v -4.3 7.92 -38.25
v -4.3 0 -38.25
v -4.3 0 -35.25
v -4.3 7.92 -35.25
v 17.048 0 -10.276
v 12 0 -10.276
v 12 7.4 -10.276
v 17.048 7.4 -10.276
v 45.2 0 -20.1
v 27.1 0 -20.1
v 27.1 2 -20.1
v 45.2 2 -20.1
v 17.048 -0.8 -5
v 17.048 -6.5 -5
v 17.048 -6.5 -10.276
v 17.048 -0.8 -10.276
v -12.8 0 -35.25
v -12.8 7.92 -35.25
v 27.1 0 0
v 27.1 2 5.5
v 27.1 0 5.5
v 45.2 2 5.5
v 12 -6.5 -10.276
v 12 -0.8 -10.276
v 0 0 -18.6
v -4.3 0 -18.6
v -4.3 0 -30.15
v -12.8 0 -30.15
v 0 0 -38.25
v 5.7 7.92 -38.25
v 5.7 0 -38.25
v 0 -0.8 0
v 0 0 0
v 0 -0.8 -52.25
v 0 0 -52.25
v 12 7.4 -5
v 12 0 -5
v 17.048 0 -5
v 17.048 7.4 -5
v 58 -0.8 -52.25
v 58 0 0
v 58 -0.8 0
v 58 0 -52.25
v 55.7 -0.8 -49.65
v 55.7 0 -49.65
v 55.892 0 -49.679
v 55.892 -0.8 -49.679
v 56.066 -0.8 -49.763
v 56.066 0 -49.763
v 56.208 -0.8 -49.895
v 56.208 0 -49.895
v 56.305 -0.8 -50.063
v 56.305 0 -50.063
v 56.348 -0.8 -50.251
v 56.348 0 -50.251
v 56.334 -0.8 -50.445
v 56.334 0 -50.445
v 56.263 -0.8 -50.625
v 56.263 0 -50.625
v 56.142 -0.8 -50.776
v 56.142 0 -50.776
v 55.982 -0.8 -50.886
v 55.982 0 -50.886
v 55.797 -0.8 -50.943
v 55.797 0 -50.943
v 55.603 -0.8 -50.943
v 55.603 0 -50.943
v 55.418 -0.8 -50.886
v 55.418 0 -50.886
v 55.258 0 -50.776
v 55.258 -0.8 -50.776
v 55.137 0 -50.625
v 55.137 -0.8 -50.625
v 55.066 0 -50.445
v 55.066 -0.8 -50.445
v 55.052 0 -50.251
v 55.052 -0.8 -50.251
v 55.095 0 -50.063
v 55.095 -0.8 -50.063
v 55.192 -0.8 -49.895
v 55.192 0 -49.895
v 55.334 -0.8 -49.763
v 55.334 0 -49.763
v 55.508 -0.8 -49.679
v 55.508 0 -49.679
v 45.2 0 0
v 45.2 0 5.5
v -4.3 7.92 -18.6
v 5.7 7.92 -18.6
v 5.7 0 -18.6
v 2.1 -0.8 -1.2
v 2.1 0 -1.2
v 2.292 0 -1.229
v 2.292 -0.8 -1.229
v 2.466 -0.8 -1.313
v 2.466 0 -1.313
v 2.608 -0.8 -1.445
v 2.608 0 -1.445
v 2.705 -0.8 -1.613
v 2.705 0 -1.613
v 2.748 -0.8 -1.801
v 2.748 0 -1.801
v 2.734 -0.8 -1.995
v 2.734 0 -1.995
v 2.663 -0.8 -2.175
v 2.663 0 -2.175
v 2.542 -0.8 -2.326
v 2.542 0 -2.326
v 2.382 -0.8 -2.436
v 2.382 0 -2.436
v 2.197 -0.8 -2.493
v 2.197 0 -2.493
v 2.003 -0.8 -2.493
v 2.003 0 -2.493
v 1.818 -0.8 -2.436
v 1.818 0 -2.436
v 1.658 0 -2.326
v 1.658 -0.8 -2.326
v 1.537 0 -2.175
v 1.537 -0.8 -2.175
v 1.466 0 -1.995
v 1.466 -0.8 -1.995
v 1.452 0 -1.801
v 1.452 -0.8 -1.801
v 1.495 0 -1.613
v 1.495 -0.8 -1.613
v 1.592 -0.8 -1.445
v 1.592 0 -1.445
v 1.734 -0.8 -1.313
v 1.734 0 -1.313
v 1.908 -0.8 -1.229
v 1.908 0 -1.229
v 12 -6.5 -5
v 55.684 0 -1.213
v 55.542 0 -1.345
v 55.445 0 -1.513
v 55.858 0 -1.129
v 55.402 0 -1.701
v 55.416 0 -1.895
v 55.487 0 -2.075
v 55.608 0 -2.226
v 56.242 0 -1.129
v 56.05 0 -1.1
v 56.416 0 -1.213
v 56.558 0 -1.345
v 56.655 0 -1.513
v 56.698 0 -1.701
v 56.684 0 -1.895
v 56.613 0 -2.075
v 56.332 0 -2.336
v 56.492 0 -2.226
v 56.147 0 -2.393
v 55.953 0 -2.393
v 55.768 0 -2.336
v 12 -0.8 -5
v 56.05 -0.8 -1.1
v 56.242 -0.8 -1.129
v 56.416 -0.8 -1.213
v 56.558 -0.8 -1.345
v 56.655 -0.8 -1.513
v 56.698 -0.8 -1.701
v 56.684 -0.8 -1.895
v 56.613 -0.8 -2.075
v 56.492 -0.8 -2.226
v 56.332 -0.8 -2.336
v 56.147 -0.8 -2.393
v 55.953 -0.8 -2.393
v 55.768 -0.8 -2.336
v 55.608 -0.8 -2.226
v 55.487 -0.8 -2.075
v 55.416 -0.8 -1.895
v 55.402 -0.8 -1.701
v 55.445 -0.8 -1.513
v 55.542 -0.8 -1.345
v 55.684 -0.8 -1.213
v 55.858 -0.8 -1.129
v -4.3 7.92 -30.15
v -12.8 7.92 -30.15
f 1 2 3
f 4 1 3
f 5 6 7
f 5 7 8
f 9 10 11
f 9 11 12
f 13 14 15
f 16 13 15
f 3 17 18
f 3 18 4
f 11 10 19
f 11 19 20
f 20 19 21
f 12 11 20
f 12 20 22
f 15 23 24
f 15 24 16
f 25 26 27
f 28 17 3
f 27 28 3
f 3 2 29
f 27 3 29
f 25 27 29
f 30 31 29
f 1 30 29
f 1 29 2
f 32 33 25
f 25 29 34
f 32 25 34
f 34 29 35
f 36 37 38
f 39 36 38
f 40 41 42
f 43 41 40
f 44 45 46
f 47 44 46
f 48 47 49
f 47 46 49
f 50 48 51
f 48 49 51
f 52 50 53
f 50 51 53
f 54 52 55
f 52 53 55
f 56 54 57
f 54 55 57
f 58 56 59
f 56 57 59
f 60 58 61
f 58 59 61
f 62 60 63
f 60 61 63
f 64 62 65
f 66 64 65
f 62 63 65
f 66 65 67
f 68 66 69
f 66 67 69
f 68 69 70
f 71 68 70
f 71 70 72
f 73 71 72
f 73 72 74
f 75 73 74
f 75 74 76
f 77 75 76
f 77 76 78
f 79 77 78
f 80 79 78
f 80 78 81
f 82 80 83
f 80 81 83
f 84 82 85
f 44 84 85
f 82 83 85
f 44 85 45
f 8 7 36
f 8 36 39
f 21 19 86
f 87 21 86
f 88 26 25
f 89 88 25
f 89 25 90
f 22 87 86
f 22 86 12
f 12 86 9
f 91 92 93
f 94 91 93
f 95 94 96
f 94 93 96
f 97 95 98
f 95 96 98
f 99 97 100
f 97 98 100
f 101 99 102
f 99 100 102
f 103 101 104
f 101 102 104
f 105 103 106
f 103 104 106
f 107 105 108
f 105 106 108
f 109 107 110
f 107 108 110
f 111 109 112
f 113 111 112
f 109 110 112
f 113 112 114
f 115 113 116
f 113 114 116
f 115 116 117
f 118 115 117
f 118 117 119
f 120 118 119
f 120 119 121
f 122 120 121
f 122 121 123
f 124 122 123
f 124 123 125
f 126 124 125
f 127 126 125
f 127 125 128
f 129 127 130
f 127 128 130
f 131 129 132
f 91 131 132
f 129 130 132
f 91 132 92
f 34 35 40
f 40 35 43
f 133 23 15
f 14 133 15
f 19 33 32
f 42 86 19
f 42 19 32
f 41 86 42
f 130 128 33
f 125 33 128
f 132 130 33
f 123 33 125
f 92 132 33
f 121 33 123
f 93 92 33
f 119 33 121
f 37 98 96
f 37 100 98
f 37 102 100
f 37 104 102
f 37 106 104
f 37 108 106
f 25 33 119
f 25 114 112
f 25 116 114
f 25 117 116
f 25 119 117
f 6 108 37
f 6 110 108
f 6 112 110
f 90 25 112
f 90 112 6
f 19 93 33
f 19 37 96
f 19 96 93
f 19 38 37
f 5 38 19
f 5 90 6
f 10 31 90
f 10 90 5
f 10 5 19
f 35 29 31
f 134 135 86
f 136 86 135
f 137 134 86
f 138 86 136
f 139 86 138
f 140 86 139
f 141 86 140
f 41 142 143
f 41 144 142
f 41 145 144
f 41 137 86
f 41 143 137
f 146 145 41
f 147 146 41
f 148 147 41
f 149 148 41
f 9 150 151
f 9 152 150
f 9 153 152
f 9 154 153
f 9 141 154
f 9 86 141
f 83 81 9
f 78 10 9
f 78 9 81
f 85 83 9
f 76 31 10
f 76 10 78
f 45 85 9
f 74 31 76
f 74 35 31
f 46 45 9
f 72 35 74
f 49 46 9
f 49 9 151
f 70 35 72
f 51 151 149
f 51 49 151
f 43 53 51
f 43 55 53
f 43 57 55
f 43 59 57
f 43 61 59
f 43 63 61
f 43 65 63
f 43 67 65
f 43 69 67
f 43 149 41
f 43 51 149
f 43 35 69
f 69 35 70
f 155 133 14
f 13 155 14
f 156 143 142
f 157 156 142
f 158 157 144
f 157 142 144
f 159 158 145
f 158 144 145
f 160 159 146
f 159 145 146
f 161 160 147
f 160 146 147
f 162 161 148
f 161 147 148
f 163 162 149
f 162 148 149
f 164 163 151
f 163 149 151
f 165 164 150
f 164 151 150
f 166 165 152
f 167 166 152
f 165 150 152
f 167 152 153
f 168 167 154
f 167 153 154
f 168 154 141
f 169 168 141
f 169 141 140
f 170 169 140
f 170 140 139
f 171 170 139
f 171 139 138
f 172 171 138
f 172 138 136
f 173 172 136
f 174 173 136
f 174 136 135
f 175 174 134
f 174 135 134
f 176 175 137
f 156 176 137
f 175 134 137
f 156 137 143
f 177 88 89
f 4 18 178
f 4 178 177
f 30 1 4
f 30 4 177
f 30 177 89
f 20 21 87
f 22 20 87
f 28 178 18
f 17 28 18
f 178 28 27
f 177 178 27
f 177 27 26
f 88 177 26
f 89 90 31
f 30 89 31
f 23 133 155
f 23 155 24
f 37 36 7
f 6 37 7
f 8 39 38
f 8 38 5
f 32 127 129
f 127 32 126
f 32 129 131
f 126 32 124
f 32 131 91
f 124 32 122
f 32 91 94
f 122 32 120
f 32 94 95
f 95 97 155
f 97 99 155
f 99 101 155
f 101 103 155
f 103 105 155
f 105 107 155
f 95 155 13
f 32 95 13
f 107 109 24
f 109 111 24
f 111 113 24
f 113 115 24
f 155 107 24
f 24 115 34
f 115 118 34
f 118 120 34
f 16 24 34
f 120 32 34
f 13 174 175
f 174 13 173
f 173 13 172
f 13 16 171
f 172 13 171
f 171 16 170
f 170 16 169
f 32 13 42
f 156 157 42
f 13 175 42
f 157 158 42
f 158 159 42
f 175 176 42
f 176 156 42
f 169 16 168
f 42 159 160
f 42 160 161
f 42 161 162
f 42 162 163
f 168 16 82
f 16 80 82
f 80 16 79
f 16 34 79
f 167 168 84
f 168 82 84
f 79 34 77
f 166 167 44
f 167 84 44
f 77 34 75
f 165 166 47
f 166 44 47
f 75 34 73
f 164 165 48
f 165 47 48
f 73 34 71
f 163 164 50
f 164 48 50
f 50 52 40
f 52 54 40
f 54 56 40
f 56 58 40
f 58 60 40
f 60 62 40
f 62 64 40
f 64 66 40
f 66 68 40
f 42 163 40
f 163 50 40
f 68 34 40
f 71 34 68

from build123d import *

# Parameters (mm, degrees)
SKETCH1_W                = 58
SKETCH1_H                = 52.25
SKETCH1_R                = 0.65
BOSS_EXTRUDE1_DEPTH      = 0.8
SKETCH1_3_W              = 5.7
SKETCH1_3_H              = 19.65
SKETCH1_3_W_2            = 8.5
SKETCH1_3_H_2            = 5.1
BOSS_EXTRUDE2_DEPTH      = 7.92
SKETCH1_4_W              = 18.1
SKETCH1_4_H              = 20.1
SKETCH1_4_H_2            = 5.5
BOSS_EXTRUDE3_DEPTH      = 2
BOSS_EXTRUDE4_DEPTH      = 8.2
BOSS_EXTRUDE4_DEPTH_BACK = 5.7
BOSS_EXTRUDE4_START      = -0.8
SKETCH1_5_W              = 5.047957292
SKETCH1_5_H              = 5.27600609


with BuildPart() as part:
    # Sketch1 → Boss-Extrude1 (new body)
    with BuildSketch(Plane(origin=(0, 0, 0), x_dir=(1, 0, 0), z_dir=(0, 1, 0))):
        with Locations((29, 26.125)):
            Rectangle(SKETCH1_W, SKETCH1_H)
        with Locations(Location((2.1, 1.85, 0), (0, 0, 270))):
            Circle(SKETCH1_R, mode=Mode.SUBTRACT)
        with Locations(Location((56.05, 1.75, 0), (0, 0, 270))):
            Circle(SKETCH1_R, mode=Mode.SUBTRACT)
        with Locations(Location((55.7, 50.3, 0), (0, 0, 270))):
            Circle(SKETCH1_R, mode=Mode.SUBTRACT)
    extrude(amount=-BOSS_EXTRUDE1_DEPTH)

    # Sketch1<3> → Boss-Extrude2 (add)
    with BuildSketch(Plane(origin=(0, 0, 0), x_dir=(1, 0, 0), z_dir=(0, 1, 0))):
        with Locations((2.85, 28.425)):
            Rectangle(SKETCH1_3_W, SKETCH1_3_H)
        Polygon((-4.3, 18.6), (0, 18.6), (0, 38.25), (-4.3, 38.25), (-4.3, 35.25), (-4.3, 30.15), align=None)
        with Locations((-8.55, 32.7)):
            Rectangle(SKETCH1_3_W_2, SKETCH1_3_H_2)
    extrude(amount=BOSS_EXTRUDE2_DEPTH)

    # Sketch1<4> → Boss-Extrude3 (add)
    with BuildSketch(Plane(origin=(0, 0, 0), x_dir=(1, 0, 0), z_dir=(0, 1, 0))):
        with Locations((36.15, 10.05)):
            Rectangle(SKETCH1_4_W, SKETCH1_4_H)
        with Locations((36.15, -2.75)):
            Rectangle(SKETCH1_4_W, SKETCH1_4_H_2)
    extrude(amount=BOSS_EXTRUDE3_DEPTH)

    # Sketch1<5> → Boss-Extrude4 (add, two sides: drawn at the far end of the back side and taken through both)
    with BuildSketch(Plane(origin=(0, 0, 0), x_dir=(1, 0, 0), z_dir=(0, 1, 0)).offset(BOSS_EXTRUDE4_START - BOSS_EXTRUDE4_DEPTH_BACK)):
        with Locations((14.523978646, 7.638003045)):
            Rectangle(SKETCH1_5_W, SKETCH1_5_H)
    extrude(amount=BOSS_EXTRUDE4_DEPTH + BOSS_EXTRUDE4_DEPTH_BACK)


solid = part.part
